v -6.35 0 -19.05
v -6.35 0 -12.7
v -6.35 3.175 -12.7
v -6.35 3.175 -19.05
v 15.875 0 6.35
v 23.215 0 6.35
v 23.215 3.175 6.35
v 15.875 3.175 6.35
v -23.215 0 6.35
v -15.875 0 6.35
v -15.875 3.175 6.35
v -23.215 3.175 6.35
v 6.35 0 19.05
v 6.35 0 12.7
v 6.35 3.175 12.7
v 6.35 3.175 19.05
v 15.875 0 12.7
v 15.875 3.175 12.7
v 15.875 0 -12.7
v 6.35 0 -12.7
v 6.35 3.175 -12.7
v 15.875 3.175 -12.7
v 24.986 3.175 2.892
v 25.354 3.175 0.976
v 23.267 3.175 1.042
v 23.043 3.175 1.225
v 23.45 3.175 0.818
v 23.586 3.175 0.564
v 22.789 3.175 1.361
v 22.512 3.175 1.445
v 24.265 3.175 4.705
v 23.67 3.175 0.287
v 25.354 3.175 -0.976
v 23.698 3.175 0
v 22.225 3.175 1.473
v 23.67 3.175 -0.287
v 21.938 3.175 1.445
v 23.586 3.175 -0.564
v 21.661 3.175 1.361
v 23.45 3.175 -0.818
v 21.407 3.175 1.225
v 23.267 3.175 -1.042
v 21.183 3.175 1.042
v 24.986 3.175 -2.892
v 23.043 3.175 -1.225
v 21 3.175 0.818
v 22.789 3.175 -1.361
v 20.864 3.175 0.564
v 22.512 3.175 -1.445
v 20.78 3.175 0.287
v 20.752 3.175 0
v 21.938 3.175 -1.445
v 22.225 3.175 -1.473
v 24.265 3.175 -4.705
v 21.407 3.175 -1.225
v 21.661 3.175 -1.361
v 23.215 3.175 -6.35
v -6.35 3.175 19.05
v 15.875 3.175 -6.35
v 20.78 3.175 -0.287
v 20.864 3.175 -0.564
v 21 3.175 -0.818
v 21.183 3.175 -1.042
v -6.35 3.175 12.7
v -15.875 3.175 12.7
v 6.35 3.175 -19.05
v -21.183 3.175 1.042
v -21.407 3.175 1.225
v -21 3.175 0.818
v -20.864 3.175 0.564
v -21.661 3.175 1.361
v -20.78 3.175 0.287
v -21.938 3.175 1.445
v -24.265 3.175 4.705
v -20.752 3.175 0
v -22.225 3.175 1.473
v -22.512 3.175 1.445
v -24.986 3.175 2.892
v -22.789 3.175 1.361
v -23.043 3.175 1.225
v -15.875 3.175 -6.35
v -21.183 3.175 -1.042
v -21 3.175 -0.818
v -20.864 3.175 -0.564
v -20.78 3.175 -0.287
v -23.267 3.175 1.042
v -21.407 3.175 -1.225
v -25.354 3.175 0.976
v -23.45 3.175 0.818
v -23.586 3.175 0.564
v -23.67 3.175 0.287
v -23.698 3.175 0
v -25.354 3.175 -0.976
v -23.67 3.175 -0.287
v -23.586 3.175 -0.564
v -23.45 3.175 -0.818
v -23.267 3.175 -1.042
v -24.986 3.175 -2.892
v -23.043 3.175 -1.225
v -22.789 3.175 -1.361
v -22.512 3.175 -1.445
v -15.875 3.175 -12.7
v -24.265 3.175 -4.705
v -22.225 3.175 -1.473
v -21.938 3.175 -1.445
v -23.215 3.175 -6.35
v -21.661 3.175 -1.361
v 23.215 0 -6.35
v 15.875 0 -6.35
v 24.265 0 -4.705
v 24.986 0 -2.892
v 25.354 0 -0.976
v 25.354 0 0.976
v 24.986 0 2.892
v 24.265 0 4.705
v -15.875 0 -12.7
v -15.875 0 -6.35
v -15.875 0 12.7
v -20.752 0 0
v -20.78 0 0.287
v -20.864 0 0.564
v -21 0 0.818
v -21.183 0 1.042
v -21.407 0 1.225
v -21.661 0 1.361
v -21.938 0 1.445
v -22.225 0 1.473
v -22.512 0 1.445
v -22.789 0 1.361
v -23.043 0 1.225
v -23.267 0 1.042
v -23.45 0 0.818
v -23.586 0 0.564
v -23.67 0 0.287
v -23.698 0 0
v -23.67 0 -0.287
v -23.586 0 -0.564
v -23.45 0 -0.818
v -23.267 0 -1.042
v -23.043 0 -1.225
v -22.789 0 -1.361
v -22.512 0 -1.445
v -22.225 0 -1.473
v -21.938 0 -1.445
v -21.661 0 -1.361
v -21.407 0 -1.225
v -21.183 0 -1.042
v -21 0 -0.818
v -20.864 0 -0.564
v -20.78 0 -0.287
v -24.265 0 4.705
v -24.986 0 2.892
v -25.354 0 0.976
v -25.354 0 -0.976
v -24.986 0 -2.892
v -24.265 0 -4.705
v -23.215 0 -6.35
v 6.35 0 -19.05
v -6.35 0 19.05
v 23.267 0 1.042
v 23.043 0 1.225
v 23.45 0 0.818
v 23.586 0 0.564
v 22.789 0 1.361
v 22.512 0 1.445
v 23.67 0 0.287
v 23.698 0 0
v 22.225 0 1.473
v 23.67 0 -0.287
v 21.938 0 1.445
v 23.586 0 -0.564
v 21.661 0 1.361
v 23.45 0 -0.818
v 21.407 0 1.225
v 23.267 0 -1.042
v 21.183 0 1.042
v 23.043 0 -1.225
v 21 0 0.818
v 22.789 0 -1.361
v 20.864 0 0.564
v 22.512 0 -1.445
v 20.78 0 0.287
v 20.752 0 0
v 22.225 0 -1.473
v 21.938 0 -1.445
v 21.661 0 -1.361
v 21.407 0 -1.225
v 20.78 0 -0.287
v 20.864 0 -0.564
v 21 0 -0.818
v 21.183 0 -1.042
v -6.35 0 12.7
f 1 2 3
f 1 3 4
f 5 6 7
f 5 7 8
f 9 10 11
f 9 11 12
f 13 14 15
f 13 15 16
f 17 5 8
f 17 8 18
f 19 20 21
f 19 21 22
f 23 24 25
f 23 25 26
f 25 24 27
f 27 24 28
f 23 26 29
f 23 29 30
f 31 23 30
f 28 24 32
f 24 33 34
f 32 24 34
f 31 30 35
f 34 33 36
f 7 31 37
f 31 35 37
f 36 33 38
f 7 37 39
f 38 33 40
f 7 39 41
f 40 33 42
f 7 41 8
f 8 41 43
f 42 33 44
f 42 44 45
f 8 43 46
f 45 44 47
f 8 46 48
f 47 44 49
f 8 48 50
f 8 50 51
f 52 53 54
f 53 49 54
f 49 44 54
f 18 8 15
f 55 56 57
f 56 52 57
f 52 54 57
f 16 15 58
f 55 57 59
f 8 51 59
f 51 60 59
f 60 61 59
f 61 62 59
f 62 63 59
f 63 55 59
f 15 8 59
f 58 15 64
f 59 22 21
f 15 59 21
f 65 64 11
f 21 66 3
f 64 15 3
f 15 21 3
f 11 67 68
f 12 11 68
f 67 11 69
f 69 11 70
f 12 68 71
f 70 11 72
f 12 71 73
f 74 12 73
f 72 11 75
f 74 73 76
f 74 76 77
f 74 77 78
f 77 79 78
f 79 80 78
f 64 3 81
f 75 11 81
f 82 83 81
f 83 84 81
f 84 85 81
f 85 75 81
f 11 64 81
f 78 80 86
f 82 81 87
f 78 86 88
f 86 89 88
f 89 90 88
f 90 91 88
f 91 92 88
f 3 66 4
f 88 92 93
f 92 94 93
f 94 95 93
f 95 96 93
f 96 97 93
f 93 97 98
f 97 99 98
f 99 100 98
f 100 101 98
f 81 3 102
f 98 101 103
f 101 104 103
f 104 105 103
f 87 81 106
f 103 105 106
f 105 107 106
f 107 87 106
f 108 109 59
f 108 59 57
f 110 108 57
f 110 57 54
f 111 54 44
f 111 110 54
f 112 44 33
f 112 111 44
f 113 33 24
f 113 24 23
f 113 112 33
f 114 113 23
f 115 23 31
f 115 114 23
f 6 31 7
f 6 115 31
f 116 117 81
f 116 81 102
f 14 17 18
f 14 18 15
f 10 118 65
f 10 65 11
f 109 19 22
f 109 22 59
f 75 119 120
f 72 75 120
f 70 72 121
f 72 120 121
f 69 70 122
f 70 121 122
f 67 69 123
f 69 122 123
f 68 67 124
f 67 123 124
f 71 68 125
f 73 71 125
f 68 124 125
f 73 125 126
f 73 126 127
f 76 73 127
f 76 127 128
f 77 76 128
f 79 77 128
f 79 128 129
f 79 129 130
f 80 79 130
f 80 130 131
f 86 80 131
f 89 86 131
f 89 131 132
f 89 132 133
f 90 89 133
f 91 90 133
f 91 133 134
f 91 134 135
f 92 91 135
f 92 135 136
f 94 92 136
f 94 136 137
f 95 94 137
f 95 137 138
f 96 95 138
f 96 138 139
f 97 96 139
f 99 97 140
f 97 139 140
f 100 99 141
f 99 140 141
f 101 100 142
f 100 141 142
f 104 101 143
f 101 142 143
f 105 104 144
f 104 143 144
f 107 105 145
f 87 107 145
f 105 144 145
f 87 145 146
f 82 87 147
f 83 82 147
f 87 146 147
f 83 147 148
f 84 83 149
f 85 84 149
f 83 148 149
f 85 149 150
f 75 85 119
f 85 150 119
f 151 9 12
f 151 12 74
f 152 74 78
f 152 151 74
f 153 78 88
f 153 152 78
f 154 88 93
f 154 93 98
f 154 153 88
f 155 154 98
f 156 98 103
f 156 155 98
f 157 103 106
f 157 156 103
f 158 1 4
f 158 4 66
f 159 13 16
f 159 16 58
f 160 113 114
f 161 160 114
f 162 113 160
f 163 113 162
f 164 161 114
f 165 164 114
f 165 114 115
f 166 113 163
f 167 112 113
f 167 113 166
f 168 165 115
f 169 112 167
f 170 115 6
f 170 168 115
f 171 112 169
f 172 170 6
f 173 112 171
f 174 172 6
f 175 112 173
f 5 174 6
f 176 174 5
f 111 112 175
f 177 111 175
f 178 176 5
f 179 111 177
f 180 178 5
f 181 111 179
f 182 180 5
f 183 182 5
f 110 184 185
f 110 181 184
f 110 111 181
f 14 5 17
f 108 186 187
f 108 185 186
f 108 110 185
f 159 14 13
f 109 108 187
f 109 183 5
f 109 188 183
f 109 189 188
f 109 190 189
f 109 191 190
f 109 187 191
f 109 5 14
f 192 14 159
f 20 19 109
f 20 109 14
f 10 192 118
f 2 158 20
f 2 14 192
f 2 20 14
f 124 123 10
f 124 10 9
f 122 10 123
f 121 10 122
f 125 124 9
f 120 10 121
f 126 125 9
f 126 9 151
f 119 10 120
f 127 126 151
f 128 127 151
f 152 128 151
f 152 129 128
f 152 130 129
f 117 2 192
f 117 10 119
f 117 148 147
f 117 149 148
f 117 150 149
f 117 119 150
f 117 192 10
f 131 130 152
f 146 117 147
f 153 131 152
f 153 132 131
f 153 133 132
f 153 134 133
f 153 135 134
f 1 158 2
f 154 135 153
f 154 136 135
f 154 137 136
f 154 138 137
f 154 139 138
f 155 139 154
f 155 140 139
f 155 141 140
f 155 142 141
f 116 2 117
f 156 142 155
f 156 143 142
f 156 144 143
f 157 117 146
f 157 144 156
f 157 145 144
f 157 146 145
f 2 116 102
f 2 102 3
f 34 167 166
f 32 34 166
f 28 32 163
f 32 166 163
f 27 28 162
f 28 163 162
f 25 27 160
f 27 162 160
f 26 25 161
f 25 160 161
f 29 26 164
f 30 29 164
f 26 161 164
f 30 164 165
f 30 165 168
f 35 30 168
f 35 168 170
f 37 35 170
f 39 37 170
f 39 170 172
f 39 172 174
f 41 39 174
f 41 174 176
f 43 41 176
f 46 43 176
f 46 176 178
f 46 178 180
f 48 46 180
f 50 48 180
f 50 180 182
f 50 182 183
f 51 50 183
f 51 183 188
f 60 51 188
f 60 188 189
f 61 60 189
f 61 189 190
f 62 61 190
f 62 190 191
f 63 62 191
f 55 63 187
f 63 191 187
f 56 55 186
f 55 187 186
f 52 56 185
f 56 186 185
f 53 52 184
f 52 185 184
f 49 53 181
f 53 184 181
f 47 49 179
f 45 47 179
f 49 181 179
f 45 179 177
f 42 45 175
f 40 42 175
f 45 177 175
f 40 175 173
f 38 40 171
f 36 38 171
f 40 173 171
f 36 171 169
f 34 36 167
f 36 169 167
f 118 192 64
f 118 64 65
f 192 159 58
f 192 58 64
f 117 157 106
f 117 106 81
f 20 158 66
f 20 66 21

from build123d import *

# Parameters (mm, degrees)
BOSS_EXTRUDE1_DEPTH       = 3.175
F_4_CLEARANCE_HOLE1_D     = 2.9464
F_4_CLEARANCE_HOLE1_DEPTH = 6.35
F_4_CLEARANCE_HOLE1_TIP   = 0.885187864


with BuildPart() as part:
    # Sketch1 → Boss-Extrude1 (new body)
    with BuildSketch(Plane(origin=(0, 0, 0), x_dir=(1, 0, 0), z_dir=(0, 1, 0))):
        with BuildLine():
            Line((-15.875, 12.7), (-6.35, 12.7))
            Line((-6.35, 12.7), (-6.35, 19.05))
            Line((-6.35, 19.05), (6.35, 19.05))
            Line((6.35, 19.05), (6.35, 12.7))
            Line((6.35, 12.7), (15.875, 12.7))
            Line((15.875, 12.7), (15.875, 6.35))
            Line((15.875, 6.35), (19.05, 6.35))
            Line((19.05, 6.35), (23.21476717, 6.35))
            ThreePointArc((23.21476717, 6.35), (25.4, 0), (23.21476717, -6.35))
            Line((23.21476717, -6.35), (19.05, -6.35))
            Line((19.05, -6.35), (15.875, -6.35))
            Line((15.875, -6.35), (15.875, -12.7))
            Line((15.875, -12.7), (6.35, -12.7))
            Line((6.35, -12.7), (6.35, -19.05))
            Line((6.35, -19.05), (-6.35, -19.05))
            Line((-6.35, -19.05), (-6.35, -12.7))
            Line((-6.35, -12.7), (-15.875, -12.7))
            Line((-15.875, -12.7), (-15.875, -6.35))
            Line((-15.875, -6.35), (-19.05, -6.35))
            Line((-19.05, -6.35), (-23.21476717, -6.35))
            ThreePointArc((-23.21476717, -6.35), (-25.4, 0), (-23.21476717, 6.35))
            Line((-23.21476717, 6.35), (-19.05, 6.35))
            Line((-19.05, 6.35), (-15.875, 6.35))
            Line((-15.875, 6.35), (-15.875, 12.7))
        make_face()
    extrude(amount=BOSS_EXTRUDE1_DEPTH)

    # #4 Clearance Hole1
    with Locations(Plane(origin=(0, 3.175, 0), x_dir=(-1, 0, 0), z_dir=(0, 1, 0))):
        with Locations((-22.225, 0), (22.225, 0)):
            Hole(F_4_CLEARANCE_HOLE1_D / 2, depth=F_4_CLEARANCE_HOLE1_DEPTH)
            with Locations((0, 0, -(F_4_CLEARANCE_HOLE1_DEPTH + F_4_CLEARANCE_HOLE1_TIP / 2))):  # 118° drill point
                Cone(0, F_4_CLEARANCE_HOLE1_D / 2, F_4_CLEARANCE_HOLE1_TIP, mode=Mode.SUBTRACT)


solid = part.part
